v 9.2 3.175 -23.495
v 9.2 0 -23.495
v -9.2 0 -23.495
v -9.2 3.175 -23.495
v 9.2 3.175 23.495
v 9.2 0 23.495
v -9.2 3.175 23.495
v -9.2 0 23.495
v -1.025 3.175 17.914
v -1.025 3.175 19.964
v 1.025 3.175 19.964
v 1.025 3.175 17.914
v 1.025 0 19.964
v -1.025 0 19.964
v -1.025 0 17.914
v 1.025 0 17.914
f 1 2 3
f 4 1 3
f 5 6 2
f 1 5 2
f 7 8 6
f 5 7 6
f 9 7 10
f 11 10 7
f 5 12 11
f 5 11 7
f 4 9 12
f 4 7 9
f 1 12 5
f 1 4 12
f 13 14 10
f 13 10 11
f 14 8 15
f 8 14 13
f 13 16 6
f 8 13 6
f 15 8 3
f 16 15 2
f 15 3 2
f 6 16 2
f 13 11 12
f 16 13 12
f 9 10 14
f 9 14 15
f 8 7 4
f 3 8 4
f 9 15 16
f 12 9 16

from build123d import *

# Parameters (mm, degrees)
SKETCH1_W           = 18.4
SKETCH1_H           = 46.99
SKETCH1_W_2         = 2.05
SKETCH1_H_2         = 2.05
SKETCH1_W_3         = 3.175
BOSS_EXTRUDE1_DEPTH = 3.175
SKETCH2_W           = 3.175
SKETCH2_H           = 46.99
CUT_EXTRUDE1_DEPTH  = 4.175


with BuildPart() as part:
    # Sketch1 → Boss-Extrude1 (new body)
    with BuildSketch(Plane(origin=(0, 0, 0), x_dir=(1, 0, 0), z_dir=(0, 1, 0))):
        Rectangle(SKETCH1_W, SKETCH1_H)
        with Locations((0, -18.93924342)):
            Rectangle(SKETCH1_W_2, SKETCH1_H_2, mode=Mode.SUBTRACT)
        with Locations((-10.7875, 0)):
            Rectangle(SKETCH1_W_3, SKETCH1_H)
    extrude(amount=BOSS_EXTRUDE1_DEPTH)

    # Sketch2 → Cut-Extrude1 (cut, through all)
    with BuildSketch(Plane(origin=(0, 3.175, 0), x_dir=(1, 0, 0), z_dir=(0, 1, 0))):
        with Locations((-10.7875, 0)):
            Rectangle(SKETCH2_W, SKETCH2_H)
    extrude(amount=-CUT_EXTRUDE1_DEPTH, mode=Mode.SUBTRACT)


solid = part.part
